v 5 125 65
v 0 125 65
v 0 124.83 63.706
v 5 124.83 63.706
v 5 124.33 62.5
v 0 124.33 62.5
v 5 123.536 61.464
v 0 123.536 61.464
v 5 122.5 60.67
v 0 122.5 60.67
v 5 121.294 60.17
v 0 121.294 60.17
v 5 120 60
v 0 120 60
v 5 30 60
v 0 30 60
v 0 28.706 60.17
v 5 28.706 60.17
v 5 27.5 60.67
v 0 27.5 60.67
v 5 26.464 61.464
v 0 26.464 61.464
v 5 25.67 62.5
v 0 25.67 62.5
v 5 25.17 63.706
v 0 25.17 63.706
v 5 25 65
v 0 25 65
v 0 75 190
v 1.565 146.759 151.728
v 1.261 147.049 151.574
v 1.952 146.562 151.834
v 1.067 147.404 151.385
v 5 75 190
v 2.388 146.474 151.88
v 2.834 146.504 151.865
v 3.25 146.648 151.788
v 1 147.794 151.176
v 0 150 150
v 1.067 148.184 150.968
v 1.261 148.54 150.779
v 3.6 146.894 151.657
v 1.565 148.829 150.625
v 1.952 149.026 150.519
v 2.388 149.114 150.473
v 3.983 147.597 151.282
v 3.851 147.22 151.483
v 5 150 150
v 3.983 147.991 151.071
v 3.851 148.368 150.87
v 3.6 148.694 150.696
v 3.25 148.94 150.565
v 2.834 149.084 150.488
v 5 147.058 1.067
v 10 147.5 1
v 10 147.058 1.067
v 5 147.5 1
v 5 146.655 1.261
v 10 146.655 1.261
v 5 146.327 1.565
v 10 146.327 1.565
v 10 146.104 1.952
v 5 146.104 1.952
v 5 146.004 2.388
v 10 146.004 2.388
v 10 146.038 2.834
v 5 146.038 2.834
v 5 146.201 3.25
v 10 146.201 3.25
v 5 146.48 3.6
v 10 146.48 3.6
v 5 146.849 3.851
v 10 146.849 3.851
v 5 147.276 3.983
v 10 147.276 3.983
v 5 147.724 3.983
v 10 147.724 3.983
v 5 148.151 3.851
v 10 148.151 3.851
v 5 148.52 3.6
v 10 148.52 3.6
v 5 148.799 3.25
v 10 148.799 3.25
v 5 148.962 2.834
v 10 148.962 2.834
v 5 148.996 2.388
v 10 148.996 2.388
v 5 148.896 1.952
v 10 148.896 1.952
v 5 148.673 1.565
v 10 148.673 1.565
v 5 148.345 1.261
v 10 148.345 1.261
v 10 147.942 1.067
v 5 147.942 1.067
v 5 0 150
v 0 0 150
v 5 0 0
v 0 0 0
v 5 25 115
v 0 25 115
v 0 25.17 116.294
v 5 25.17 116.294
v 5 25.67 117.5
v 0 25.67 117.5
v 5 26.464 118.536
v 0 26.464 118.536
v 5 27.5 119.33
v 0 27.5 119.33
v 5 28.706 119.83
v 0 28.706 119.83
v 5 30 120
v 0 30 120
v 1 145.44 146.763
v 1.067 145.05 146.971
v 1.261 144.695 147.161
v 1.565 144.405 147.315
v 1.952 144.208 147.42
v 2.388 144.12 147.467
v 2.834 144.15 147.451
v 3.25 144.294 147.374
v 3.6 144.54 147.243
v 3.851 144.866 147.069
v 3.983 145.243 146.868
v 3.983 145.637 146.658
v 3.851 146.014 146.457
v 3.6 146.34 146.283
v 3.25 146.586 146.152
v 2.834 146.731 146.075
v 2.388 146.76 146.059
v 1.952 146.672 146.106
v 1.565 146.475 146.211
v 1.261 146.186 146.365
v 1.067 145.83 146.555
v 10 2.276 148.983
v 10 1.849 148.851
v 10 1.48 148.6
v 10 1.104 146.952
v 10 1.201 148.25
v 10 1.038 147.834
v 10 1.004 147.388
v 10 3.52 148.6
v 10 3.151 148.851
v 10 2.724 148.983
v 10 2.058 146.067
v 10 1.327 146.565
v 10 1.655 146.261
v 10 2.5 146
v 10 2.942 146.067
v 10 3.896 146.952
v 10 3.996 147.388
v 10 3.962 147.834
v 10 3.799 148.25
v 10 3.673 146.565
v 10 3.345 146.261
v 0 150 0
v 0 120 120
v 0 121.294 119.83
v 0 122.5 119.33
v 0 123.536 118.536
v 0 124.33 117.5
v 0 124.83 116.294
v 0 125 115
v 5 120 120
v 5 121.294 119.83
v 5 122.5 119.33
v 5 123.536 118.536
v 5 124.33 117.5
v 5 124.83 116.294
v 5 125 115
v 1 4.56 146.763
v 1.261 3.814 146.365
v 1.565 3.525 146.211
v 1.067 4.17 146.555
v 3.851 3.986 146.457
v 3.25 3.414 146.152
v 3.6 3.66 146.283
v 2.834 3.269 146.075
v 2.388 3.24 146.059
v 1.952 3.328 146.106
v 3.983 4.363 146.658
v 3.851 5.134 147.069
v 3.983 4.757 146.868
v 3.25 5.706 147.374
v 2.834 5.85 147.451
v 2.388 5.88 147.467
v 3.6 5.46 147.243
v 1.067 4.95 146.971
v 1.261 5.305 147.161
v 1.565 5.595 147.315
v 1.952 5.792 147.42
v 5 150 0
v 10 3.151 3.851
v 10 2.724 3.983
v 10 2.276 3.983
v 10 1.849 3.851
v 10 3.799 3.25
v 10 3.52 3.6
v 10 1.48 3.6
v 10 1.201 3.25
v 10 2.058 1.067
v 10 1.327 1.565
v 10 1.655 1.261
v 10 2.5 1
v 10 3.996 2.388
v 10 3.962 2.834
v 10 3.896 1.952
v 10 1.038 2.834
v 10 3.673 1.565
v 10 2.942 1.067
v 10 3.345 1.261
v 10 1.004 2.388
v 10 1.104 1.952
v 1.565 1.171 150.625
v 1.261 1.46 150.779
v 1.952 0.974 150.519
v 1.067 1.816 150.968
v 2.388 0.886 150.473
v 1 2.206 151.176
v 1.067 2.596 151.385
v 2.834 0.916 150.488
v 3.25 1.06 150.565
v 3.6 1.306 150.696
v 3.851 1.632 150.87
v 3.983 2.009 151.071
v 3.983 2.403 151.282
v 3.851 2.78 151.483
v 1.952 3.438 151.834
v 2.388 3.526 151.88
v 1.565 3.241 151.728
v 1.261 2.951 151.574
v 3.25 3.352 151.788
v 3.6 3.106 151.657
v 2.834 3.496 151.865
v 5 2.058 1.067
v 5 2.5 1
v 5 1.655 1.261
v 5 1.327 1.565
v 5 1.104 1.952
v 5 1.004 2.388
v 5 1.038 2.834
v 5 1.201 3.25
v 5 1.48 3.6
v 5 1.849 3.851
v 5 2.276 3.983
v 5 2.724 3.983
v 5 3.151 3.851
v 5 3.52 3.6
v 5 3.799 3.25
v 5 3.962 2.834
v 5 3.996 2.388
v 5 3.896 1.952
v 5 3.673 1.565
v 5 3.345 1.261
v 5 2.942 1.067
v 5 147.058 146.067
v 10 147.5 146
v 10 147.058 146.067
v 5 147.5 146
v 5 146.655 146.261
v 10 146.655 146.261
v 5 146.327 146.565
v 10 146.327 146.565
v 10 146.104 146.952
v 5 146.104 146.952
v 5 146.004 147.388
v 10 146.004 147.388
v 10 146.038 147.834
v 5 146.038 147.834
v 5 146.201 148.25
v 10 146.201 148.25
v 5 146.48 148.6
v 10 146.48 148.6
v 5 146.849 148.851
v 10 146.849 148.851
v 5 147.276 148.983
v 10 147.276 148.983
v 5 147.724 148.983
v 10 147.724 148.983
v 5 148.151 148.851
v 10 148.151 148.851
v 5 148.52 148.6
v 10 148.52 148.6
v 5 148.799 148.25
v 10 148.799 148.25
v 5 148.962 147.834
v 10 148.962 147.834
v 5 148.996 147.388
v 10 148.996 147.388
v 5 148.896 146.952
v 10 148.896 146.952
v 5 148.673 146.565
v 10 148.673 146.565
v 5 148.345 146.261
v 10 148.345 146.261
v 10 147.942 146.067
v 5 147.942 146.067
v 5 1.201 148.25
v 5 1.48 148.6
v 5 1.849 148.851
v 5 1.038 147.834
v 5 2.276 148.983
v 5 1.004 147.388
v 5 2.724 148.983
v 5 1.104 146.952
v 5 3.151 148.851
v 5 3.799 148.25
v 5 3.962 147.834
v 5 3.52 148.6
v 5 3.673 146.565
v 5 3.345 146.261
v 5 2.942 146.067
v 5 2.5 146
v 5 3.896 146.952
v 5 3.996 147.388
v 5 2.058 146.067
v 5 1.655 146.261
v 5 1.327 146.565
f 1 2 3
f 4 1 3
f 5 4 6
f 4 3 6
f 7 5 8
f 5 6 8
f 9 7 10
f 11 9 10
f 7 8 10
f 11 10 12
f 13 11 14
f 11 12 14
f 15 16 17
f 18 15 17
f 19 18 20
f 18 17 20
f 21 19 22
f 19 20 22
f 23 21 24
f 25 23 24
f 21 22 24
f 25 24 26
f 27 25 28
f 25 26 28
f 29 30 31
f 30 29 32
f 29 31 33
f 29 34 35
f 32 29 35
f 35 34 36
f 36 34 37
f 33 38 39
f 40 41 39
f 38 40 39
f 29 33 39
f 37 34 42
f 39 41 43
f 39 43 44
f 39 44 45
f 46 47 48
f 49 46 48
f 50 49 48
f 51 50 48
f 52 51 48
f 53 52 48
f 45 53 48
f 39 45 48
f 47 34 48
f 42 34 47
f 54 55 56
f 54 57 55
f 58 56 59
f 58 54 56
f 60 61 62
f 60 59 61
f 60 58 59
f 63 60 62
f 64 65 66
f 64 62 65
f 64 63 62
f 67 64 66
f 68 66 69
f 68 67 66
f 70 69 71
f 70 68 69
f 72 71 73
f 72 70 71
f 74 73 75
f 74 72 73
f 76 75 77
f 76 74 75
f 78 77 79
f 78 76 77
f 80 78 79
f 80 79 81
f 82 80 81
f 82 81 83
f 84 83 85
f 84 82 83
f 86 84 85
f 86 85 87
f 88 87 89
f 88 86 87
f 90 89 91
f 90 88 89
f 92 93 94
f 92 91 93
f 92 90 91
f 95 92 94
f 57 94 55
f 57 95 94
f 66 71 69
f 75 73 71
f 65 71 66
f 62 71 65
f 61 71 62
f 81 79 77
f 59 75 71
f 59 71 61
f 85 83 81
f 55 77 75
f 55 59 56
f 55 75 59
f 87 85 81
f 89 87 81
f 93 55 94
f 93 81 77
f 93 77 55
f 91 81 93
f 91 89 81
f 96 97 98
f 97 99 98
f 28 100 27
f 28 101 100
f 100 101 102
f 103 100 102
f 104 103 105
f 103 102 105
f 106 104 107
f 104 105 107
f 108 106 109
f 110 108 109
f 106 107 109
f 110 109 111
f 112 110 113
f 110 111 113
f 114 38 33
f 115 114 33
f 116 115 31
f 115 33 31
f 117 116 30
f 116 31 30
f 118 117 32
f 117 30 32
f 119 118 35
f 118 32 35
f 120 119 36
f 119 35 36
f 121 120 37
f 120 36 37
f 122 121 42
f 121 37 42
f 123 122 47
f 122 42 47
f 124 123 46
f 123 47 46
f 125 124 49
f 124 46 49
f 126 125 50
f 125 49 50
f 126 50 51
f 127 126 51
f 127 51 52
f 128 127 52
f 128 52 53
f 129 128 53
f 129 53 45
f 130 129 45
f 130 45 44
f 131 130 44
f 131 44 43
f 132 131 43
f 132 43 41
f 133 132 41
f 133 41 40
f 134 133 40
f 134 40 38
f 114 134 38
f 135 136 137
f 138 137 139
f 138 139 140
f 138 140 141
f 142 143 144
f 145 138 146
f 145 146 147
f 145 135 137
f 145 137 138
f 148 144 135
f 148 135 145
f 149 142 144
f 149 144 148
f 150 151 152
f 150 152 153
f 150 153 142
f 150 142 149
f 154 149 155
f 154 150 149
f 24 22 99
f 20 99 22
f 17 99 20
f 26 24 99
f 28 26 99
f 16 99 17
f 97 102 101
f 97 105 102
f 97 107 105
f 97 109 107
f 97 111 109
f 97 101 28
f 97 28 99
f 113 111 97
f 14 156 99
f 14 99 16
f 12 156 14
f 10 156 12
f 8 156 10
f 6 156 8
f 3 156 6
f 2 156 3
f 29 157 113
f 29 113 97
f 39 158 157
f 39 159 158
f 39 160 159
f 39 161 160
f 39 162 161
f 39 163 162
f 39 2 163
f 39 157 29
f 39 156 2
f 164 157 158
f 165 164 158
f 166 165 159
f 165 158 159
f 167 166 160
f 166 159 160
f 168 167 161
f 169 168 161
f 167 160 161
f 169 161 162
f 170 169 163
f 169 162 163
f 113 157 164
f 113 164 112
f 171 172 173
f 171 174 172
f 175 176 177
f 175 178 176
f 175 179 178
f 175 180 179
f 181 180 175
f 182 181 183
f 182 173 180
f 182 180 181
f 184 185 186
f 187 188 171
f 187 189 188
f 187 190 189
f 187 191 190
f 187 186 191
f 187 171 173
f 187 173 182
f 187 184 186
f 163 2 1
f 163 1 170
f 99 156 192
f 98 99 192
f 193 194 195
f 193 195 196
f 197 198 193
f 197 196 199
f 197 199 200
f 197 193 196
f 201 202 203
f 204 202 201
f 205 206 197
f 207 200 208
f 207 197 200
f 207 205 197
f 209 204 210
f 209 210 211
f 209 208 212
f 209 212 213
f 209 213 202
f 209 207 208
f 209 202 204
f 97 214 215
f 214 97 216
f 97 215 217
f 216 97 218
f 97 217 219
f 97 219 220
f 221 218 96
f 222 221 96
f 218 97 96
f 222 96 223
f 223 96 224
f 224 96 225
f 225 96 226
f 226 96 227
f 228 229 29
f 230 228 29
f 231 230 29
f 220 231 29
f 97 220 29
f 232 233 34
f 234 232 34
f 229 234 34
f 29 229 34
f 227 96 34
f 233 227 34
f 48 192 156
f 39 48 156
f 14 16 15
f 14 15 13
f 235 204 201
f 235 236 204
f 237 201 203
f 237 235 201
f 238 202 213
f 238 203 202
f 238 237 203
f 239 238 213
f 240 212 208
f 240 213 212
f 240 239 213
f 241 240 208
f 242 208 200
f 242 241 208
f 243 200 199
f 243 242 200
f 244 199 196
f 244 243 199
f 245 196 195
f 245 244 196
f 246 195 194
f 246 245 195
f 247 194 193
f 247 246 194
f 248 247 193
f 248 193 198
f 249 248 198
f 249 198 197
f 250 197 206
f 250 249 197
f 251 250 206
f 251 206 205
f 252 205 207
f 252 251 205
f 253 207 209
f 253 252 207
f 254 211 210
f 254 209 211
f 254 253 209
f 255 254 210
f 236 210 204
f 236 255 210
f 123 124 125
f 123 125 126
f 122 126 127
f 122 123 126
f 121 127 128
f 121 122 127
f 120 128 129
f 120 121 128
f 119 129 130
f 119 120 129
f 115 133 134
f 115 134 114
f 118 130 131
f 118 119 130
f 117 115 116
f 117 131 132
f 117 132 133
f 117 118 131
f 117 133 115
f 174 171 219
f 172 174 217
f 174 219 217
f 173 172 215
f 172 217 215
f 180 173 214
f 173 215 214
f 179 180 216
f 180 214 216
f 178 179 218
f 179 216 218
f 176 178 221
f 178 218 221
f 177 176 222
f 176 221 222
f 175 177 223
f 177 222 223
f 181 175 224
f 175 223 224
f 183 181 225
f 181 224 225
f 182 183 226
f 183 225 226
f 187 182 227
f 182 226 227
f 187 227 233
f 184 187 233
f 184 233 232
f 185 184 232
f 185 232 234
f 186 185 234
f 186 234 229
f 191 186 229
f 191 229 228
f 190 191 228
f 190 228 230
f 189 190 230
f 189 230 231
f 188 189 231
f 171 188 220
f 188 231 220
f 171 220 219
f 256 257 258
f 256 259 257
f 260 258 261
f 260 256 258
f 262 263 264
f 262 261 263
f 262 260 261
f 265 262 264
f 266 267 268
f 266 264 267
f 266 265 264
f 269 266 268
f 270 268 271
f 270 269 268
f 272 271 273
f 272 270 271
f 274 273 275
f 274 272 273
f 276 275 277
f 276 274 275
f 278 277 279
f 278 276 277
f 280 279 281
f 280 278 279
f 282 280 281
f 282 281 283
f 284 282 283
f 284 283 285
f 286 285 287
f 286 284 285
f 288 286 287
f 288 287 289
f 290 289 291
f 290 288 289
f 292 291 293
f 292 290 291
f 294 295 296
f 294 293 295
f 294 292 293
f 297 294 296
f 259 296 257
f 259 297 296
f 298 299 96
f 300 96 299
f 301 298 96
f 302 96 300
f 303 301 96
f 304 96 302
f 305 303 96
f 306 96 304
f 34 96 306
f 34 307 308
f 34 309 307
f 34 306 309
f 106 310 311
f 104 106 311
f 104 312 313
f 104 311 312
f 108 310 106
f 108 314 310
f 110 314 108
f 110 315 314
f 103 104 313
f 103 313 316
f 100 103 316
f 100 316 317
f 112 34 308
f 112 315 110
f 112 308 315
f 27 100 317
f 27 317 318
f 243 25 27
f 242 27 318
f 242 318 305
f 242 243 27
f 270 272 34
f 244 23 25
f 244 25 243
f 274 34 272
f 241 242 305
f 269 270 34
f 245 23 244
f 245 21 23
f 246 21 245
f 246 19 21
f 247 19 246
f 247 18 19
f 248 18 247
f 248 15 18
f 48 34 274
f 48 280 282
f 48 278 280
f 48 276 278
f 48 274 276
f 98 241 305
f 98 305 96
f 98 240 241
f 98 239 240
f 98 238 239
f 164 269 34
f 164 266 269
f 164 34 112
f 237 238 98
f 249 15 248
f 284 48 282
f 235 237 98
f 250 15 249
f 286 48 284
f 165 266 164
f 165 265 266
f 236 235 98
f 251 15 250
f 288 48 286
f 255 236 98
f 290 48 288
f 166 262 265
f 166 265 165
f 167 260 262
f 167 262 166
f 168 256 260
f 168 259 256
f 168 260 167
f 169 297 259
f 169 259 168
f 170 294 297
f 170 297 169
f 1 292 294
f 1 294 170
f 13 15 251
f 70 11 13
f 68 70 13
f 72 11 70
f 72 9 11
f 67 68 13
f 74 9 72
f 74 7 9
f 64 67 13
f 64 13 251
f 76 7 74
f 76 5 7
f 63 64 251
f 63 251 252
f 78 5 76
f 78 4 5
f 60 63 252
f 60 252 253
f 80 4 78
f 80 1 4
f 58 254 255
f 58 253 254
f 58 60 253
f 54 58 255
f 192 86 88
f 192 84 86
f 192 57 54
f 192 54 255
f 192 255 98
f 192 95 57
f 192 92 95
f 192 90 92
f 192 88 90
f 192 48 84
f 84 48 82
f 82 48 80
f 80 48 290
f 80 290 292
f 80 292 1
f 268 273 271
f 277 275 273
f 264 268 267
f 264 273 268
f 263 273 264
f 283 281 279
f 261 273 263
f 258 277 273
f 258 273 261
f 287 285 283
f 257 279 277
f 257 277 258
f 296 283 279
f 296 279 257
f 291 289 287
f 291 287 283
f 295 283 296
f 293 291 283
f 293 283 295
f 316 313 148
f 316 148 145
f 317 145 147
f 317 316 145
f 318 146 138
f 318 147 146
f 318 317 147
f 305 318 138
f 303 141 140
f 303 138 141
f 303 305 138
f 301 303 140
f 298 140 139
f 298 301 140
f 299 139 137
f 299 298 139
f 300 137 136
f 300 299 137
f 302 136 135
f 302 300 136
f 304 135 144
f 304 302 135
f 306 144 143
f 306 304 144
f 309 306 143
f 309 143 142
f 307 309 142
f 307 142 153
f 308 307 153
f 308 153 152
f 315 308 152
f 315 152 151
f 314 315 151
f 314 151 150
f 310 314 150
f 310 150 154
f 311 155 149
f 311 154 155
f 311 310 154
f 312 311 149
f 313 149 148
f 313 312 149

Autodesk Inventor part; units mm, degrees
sketch "Boceto1" plane through (0, 0, 0) normal (0, 0, 1) x (1, 0, 0)
  line L0 (0, 0) -> (150, 0)
  line L1 (150, 0) -> (150, 150)
  line L2 (150, 150) -> (0, 150)
  line L3 (0, 150) -> (0, 0)
  line L4 (5, 145) -> (145, 145)
  line L5 (145, 145) -> (145, 5)
  line L6 (145, 5) -> (5, 5)
  line L7 (5, 5) -> (5, 145)
  dimension "d0" = 150
  dimension "d1" = 150
  dimension "d2" = 5
extrude "Extrusión1" add sketch "Boceto1" along normal blind 150
sketch "Boceto2" plane through (150, 0, 0) normal (1, 0, 0) x (0, 0, -1)
  line L0 (-150, 0) -> (-150, 150) projected
  line L1 (-150, 75) -> (-190, 75) construction
  line L2 (-190, 75) -> (-150, 150)
  line L3 (0, 0) -> (-150, 0) construction
  line L4 (-150, 0) -> (-190, 75)
  dimension "d5" = 40
extrude "Extrusión2" add sketch "Boceto2" against normal blind 5
ref_plane "Plano de trabajo1" through (75, 0, 0) normal (1, 0, 0) x (0, 0, -1)
mirror "Simetría1" about plane through (75, 0, 0) normal (1, 0, 0) of "Extrusión2"
sketch "Boceto3" plane through (0, 150, 0) normal (0, 1, 0) x (1, 0, 0)
  line L0 (105, -60) -> (45, -60)
  line L1 (45, -60) -> (45, -95)
  line L2 (60, -110) -> (90, -110)
  line L3 (105, -95) -> (105, -60)
  line L4 (150, 0) -> (0, 0) projected
  line L5 (145, -150) -> (5, -150) projected
  arc A0 (90, -110) -> (105, -95) centre (90, -95) ccw
  arc A1 (45, -95) -> (60, -110) centre (60, -95) ccw
  point P0 (45, -110)
  point P1 (105, -110)
  point P2 (75, -60)
  point P3 (75, 0)
  dimension "d8" = 60
  dimension "d9" = 50
  dimension "d10" = 40
  dimension "d11" = 15
extrude "Extrusión3" cut sketch "Boceto3" against normal through all
sketch "Boceto4" plane through (150, 0, 0) normal (1, 0, 0) x (0, 0, -1)
  line L0 (-13, 20) -> (-123, 20)
  line L1 (-128, 25) -> (-128, 75)
  line L2 (-123, 80) -> (-13, 80)
  line L3 (-8, 75) -> (-8, 25)
  line L4 (0, 0) -> (0, 150) projected
  line L5 (0, 0) -> (-150, 0) projected
  arc A0 (-123, 80) -> (-128, 75) centre (-123, 75) ccw
  arc A1 (-8, 75) -> (-13, 80) centre (-13, 75) ccw
  arc A2 (-13, 20) -> (-8, 25) centre (-13, 25) ccw
  arc A3 (-128, 25) -> (-123, 20) centre (-123, 25) ccw
  point P0 (-128, 80)
  point P1 (-128, 20)
  point P2 (-8, 80)
  dimension "d14" = 120
  dimension "d15" = 60
  dimension "d16" = 8
  dimension "d17" = 20
  dimension "d18" = 5
extrude "Extrusión4" cut sketch "Boceto4" against normal up to surface (5 mm away)
sketch "Boceto5" plane through (0, 0, 0) normal (-1, 0, 0) x (0, 0, 1)
  line L0 (65, 125) -> (115, 125)
  line L1 (120, 120) -> (120, 30)
  line L2 (115, 25) -> (65, 25)
  line L3 (60, 30) -> (60, 120)
  line L4 (0, 150) -> (0, 0) projected
  arc A0 (120, 120) -> (115, 125) centre (115, 120) ccw
  arc A1 (115, 25) -> (120, 30) centre (115, 30) ccw
  arc A2 (65, 125) -> (60, 120) centre (65, 120) ccw
  arc A3 (60, 30) -> (65, 25) centre (65, 30) ccw
  point P0 (60, 150)
  point P1 (120, 25)
  point P2 (120, 125)
  point P3 (60, 25)
  point P4 (60, 75)
  point P5 (0, 75)
  dimension "d21" = 60
  dimension "d22" = 100
  dimension "d23" = 60
  dimension "d24" = 5
extrude "Extrusión5" cut sketch "Boceto5" against normal blind 10
sketch "Boceto6" plane through (150, 0, 0) normal (1, 0, 0) x (0, 0, -1)
  line L0 (-190, 75) -> (-150, 0) projected
  line L1 (-150, 150) -> (-190, 75) projected
  line L2 (-154.4118, 152.3529) -> (-195.6667, 75)
  line L3 (-195.6667, 75) -> (-154.4118, -2.3529)
  line L4 (-154.4118, 152.3529) -> (-144.4118, 152.3529)
  line L5 (-144.4118, 152.3529) -> (-144.4118, 150)
  line L6 (-154.4118, -2.3529) -> (-144.4118, -2.3529)
  line L7 (-144.4118, -2.3529) -> (-144.4118, 0)
  line L8 (0, 0) -> (-150, 0) projected
  line L9 (0, 150) -> (-150, 150) projected
  dimension "d27" = 5
  dimension "d28" = 10
extrude "Extrusión6" add sketch "Boceto6" along normal blind 10 and the other way blind 160
fillet "Empalme1" radius 5 3 edges at (75, 152.3529, 154.4118) (75, 75, 195.6667) (75, -2.3529, 154.4118)
sketch "Boceto7" plane through (150, 25, 8) normal (0, 0, 1) x (1, 0, 0)
  circle A0 centre (-2.5, 2.5) radius 1.25
  line L0 (0, 50) -> (0, 0) projected
  line L1 (0, 0) -> (-5, 0) projected
  point P0 (-150, -25)
  point P1 (-2.5, 0)
  dimension "d34" = 2.5
  dimension "d35" = 2.5
  dimension "d36" = 2.5
extrude "Extrusión7" cut sketch "Boceto7" against normal blind 3
ref_plane "Plano de trabajo2" through (150, 25, 68) normal (0, 0, 1) x (1, 0, 0)
mirror "Simetría2" about plane through (150, 25, 68) normal (0, 0, 1) of "Extrusión7"
sketch "Boceto8" plane through (160, 0, 0) normal (1, 0, 0) x (0, 0, -1)
  arc A0 (-155.8235, 0.2941) -> (-151.4118, -2.3529) centre (-151.4118, 2.6471) ccw projected
  line L0 (-151.4118, -2.3529) -> (-144.4118, -2.3529) projected
  line L1 (-144.4118, -2.3529) -> (-144.4118, 0) projected
  line L2 (-144.4118, 0) -> (-150, 0) projected
  line L3 (-150, 0) -> (-190, 75) projected
  line L4 (-190, 75) -> (-150, 150) projected
  line L5 (-150, 150) -> (-144.4118, 150) projected
  line L6 (-144.4118, 150) -> (-144.4118, 152.3529) projected
  line L7 (-144.4118, 152.3529) -> (-151.4118, 152.3529) projected
  arc A1 (-151.4118, 152.3529) -> (-155.8235, 149.7059) centre (-151.4118, 147.3529) ccw projected
  line L8 (-155.8235, 149.7059) -> (-194.4118, 77.3529) projected
  arc A2 (-194.4118, 77.3529) -> (-194.4118, 72.6471) centre (-190, 75) ccw projected
  line L9 (-194.4118, 72.6471) -> (-155.8235, 0.2941) projected
  point P0 (0, 0)
extrude "Extrusión8" cut sketch "Boceto8" against normal through all
sketch "Boceto9" plane through (145, 0, 150) normal (0, -0.4705882, 0.8823529) x (1, 0, 0)
  circle A0 centre (2.5, 2.5) radius 1.5
  line L0 (5, 85) -> (5, 0) projected
  line L1 (5, 0) -> (0, 0) projected
  point P0 (-145, -70.5882)
  dimension "d41" = 3
  dimension "d42" = 2.5
  dimension "d43" = 2.5
extrude "Extrusión9" cut sketch "Boceto9" against normal blind 5
ref_plane "Plano de trabajo3" through (75, 0, 0) normal (1, 0, 0) x (0, 0, -1)
ref_plane "Plano de trabajo4" through (0, 75, 0) normal (0, -1, 0) x (1, 0, 0)
mirror "Simetría3" about plane through (75, 0, 0) normal (1, 0, 0) of "Extrusión9"
mirror "Simetría4" about plane through (0, 75, 0) normal (0, -1, 0) of "Extrusión8", "Extrusión9", "Simetría3"
sketch "Boceto10" plane through (150, 0, 0) normal (1, 0, 0) x (0, 0, -1)
  arc A0 (-13, 20) -> (-8, 25) centre (-13, 25) ccw projected
  line L0 (-13, 20) -> (-123, 20) projected
  arc A1 (-128, 25) -> (-123, 20) centre (-123, 25) ccw projected
  line L1 (-128, 25) -> (-128, 75) projected
  arc A2 (-123, 80) -> (-128, 75) centre (-123, 75) ccw projected
  line L2 (-123, 80) -> (-13, 80) projected
  arc A3 (-8, 75) -> (-13, 80) centre (-13, 75) ccw projected
  line L3 (-8, 75) -> (-8, 25) projected
  line L4 (0, 0) -> (0, 150) projected
  line L5 (0, 150) -> (-150, 150) projected
  line L6 (-150, 150) -> (-190, 75) projected
  line L7 (-190, 75) -> (-150, 0) projected
  line L8 (0, 0) -> (-150, 0) projected
  point P0 (0, 0)
extrude "Extrusión10" cut sketch "Boceto10" against normal up to surface (145 mm away) contours L0 A1 L1 A2 L2 A3 L3 A0 | L8 L7 L6 L5 L4
sketch "Boceto11" plane through (5, 0, 0) normal (1, 0, 0) x (0, 0, -1)
  circle A0 centre (-147.5, 2.5) radius 1.5
  line L0 (0, 0) -> (-150, 0) projected
  line L1 (-190, 75) -> (-150, 0) construction
  line L2 (-190, 75) -> (75.3721, 75) construction
  line L3 (-75, 153.8029) -> (-75, -92.275) construction
  circle A1 centre (-147.5, 147.5) radius 1.5
  circle A2 centre (-2.5, 2.5) radius 1.5
  circle A3 centre (-2.5, 147.5) radius 1.5
  dimension "d48" = 3
  dimension "d49" = 2.5
  dimension "d50" = 2.5
extrude "Extrusión11" add sketch "Boceto11" along normal blind 5
properties part number "CasaJugueteAPM" material "Plástico ABS"
